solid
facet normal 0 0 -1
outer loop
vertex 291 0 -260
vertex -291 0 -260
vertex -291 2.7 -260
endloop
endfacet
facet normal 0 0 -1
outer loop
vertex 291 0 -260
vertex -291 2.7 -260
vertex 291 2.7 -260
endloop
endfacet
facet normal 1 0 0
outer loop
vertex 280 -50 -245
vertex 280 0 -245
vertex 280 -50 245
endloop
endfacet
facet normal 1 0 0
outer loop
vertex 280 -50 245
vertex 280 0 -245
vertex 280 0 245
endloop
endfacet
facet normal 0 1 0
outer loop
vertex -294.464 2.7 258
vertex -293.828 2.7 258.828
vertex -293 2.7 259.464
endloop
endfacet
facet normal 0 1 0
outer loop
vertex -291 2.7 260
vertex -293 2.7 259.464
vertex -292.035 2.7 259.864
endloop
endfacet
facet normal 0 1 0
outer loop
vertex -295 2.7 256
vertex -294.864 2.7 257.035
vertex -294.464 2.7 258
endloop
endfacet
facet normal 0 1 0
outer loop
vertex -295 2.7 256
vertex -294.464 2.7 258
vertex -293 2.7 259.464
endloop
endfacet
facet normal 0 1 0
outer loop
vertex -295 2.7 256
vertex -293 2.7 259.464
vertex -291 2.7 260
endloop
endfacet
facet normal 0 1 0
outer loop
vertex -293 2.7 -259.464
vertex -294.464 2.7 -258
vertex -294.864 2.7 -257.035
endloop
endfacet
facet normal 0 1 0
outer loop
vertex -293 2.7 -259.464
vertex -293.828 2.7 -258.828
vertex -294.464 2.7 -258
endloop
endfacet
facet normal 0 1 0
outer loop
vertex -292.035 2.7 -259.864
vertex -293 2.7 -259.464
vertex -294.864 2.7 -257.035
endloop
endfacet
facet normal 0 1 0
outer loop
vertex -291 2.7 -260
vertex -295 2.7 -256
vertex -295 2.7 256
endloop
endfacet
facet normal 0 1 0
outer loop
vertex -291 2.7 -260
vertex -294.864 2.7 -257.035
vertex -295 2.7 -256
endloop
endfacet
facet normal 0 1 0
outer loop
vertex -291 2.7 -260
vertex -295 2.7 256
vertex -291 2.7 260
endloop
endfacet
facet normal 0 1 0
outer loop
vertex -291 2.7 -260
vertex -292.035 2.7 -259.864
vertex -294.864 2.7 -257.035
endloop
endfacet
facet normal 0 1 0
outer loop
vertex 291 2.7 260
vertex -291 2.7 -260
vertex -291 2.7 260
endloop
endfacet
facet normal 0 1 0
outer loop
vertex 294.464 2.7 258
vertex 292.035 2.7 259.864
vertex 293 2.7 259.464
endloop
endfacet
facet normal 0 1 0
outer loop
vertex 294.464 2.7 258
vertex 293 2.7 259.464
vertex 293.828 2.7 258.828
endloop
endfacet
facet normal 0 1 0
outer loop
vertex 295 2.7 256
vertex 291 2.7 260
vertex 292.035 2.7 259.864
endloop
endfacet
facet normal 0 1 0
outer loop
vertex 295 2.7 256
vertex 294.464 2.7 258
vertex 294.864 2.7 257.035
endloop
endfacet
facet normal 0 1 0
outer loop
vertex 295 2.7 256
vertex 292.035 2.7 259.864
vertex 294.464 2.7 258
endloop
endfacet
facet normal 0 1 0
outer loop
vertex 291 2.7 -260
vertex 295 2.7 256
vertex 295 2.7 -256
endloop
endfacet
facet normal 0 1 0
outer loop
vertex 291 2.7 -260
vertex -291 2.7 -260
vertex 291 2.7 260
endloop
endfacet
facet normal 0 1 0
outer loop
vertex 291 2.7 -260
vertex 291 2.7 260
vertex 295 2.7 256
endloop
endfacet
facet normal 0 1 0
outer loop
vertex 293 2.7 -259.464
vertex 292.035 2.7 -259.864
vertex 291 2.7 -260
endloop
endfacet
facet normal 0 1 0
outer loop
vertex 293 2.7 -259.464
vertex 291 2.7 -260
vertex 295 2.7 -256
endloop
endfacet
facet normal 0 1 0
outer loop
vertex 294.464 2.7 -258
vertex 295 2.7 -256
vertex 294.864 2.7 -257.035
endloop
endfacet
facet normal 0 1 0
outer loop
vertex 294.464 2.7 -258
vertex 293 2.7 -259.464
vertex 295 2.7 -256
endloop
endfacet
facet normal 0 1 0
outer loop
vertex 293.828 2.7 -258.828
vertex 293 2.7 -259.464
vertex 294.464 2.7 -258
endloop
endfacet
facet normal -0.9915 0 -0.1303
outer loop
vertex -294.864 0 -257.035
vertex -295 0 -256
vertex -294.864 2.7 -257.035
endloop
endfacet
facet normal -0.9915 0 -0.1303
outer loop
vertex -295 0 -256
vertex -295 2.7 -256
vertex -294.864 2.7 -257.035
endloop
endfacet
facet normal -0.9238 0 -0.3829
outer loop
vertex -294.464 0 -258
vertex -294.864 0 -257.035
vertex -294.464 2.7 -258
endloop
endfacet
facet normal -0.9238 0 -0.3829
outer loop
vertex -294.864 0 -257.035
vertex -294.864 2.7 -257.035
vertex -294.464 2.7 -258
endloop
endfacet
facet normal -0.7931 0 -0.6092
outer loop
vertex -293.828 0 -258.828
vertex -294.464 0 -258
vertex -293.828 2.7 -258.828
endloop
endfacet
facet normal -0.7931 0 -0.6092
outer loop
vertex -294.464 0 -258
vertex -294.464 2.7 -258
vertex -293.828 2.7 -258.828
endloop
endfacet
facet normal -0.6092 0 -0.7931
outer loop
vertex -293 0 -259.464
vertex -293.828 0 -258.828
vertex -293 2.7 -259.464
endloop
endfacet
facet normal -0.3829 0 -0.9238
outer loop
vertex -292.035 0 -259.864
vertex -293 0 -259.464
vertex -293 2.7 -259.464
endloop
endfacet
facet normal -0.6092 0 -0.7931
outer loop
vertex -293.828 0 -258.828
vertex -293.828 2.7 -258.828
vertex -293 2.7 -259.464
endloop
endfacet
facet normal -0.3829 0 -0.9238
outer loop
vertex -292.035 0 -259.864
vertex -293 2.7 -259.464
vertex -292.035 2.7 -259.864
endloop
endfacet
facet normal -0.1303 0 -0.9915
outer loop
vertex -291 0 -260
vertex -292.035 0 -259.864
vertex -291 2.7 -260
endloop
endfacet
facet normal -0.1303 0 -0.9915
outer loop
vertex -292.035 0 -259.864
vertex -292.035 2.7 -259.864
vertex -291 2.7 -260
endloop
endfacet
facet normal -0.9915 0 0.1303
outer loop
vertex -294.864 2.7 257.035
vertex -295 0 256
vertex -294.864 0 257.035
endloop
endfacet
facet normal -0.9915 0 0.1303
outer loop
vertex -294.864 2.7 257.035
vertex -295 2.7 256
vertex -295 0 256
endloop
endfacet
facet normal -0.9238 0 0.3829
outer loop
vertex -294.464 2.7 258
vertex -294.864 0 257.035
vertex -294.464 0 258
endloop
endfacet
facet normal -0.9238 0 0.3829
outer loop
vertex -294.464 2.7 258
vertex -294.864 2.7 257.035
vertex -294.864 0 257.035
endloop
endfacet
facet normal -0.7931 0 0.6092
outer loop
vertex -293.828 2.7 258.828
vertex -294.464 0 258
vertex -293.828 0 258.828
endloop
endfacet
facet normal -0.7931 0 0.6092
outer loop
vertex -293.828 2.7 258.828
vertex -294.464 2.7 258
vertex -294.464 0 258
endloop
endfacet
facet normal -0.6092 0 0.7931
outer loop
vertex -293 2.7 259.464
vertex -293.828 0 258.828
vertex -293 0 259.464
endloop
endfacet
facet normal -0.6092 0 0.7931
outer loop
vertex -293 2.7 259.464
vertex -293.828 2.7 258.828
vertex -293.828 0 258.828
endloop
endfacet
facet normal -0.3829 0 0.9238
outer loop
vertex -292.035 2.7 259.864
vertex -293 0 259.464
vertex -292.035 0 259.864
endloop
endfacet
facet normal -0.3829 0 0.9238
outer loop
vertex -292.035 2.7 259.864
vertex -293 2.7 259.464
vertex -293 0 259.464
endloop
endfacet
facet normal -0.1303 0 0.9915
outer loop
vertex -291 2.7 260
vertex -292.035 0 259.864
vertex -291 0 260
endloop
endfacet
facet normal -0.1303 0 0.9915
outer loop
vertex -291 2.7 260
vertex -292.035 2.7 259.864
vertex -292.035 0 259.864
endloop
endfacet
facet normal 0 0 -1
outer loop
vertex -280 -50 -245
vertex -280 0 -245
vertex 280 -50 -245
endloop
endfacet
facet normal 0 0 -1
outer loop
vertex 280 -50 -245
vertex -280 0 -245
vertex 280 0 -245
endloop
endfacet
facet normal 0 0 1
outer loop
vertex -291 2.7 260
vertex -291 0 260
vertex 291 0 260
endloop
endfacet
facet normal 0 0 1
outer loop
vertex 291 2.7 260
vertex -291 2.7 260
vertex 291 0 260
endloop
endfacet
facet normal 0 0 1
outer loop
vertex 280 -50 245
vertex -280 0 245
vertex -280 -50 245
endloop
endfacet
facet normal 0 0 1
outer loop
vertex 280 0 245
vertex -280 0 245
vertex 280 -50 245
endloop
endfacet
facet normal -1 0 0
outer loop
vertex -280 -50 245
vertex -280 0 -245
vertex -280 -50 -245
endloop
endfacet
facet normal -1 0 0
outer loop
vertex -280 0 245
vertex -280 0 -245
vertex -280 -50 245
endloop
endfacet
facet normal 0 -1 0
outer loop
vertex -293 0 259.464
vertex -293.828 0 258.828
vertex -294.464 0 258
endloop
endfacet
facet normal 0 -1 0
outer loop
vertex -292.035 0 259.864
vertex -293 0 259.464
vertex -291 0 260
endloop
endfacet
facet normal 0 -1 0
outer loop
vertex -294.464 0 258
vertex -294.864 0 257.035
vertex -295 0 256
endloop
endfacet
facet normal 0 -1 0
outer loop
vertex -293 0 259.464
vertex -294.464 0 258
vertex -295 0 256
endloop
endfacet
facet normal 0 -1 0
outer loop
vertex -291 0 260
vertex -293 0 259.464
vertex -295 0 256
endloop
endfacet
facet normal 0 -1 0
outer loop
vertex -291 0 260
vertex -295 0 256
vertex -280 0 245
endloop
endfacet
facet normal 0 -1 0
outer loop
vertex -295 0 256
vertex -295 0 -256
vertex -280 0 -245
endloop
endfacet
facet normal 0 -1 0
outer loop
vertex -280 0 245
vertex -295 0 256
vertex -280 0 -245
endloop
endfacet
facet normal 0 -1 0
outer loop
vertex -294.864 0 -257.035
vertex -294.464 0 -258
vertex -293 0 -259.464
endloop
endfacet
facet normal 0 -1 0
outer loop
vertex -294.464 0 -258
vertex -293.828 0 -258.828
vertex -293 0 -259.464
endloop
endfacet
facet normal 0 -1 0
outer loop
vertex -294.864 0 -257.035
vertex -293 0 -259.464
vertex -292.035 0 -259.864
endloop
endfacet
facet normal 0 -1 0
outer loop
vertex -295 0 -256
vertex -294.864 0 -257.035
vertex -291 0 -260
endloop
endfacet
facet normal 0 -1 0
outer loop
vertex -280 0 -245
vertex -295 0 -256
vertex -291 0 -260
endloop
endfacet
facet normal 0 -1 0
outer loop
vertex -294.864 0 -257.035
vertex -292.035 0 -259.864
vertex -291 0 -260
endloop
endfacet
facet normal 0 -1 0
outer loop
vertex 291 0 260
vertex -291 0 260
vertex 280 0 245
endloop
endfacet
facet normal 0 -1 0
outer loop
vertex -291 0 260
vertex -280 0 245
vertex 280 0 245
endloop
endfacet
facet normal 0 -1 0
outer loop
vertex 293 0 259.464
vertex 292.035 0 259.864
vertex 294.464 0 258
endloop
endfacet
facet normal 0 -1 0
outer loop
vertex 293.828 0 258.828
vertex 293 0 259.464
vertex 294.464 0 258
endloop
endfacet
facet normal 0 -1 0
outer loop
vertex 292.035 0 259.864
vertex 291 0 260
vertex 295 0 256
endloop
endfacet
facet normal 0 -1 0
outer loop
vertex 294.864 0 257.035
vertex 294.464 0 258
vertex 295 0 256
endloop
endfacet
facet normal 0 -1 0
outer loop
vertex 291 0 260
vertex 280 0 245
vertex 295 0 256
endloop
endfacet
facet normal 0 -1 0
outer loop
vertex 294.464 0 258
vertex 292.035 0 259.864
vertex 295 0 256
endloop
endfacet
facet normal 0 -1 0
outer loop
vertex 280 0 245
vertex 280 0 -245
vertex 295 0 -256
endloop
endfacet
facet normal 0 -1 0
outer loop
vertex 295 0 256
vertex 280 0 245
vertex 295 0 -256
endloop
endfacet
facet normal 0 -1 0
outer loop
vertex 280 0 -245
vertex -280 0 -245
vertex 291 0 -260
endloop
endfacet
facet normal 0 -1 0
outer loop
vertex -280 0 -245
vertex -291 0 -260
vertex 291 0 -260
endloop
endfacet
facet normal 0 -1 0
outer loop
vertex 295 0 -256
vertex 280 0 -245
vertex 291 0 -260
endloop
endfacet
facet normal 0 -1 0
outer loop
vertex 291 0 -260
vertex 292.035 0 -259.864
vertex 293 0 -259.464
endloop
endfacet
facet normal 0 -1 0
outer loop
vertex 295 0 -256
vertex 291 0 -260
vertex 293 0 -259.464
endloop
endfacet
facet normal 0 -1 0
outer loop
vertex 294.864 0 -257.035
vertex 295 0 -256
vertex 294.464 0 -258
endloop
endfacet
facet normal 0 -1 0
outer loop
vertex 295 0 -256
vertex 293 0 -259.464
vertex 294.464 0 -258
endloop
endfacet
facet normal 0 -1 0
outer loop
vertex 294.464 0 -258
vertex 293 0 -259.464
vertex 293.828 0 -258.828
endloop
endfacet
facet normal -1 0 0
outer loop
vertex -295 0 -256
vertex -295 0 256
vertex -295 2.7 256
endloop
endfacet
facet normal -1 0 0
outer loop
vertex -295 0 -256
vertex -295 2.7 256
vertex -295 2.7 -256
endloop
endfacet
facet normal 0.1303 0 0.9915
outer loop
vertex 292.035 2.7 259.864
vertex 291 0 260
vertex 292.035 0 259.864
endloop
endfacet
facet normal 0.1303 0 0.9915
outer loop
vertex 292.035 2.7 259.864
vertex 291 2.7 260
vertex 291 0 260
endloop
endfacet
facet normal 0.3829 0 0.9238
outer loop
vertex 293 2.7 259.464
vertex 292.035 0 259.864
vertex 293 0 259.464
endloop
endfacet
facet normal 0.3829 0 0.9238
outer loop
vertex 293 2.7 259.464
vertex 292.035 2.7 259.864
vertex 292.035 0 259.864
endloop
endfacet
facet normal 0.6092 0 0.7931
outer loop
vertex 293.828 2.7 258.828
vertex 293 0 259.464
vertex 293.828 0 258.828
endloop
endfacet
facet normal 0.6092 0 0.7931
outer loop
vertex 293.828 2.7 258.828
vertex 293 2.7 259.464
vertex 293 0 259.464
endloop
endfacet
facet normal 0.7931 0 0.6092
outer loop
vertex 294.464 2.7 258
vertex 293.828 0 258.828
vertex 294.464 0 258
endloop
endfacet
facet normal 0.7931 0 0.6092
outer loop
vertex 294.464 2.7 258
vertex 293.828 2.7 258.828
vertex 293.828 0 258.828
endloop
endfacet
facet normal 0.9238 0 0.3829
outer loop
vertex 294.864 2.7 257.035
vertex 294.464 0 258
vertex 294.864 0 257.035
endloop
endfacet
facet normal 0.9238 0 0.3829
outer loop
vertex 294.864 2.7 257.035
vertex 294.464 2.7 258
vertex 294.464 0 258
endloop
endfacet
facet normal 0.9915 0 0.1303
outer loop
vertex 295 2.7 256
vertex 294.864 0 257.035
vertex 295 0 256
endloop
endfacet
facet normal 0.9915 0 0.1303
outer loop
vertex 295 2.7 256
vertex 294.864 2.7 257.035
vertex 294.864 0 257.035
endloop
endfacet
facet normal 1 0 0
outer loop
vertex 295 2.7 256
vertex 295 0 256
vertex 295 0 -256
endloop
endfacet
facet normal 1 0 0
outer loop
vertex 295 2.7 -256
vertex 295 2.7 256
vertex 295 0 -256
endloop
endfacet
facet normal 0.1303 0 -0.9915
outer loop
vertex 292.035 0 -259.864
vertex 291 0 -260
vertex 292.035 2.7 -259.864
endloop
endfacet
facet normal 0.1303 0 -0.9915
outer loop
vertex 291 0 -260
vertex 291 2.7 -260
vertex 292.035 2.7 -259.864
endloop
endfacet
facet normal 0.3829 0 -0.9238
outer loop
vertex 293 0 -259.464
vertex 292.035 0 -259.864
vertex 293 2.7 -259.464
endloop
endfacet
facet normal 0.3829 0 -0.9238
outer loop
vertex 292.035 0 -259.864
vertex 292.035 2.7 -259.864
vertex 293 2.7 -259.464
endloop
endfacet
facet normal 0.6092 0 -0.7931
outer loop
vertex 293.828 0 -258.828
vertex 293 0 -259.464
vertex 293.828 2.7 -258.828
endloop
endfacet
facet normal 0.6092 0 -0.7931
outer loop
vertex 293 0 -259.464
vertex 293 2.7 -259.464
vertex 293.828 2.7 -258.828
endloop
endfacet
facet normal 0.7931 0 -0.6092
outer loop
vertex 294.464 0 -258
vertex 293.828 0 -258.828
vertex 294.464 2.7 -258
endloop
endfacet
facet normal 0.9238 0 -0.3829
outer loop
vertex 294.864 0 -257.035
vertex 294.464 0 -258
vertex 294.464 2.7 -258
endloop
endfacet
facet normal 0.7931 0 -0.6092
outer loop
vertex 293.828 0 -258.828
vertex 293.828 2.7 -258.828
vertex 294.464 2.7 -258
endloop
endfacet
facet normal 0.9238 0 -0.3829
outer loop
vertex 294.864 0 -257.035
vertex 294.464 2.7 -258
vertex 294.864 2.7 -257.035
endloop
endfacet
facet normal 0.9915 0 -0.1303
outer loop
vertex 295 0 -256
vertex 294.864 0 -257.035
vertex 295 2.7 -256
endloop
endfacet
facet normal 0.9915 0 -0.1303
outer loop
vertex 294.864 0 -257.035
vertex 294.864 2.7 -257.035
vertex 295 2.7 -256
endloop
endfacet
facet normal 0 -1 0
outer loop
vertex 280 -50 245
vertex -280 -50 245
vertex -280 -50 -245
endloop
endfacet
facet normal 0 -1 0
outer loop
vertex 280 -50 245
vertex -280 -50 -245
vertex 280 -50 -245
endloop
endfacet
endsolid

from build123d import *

# Parameters (mm, degrees)
SKETCH1_W           = 590
SKETCH1_H           = 520
BOSS_EXTRUDE1_DEPTH = 2.7
SKETCH2_W           = 560
SKETCH2_H           = 490
BOSS_EXTRUDE2_DEPTH = 50
FILLET1_R           = 4


with BuildPart() as part:
    # Sketch1 → Boss-Extrude1 (new body)
    with BuildSketch(Plane(origin=(0, 0, 0), x_dir=(1, 0, 0), z_dir=(0, 1, 0))):
        Rectangle(SKETCH1_W, SKETCH1_H)
    extrude(amount=BOSS_EXTRUDE1_DEPTH)

    # Sketch2 → Boss-Extrude2 (add)
    with BuildSketch(Plane.XZ):
        Rectangle(SKETCH2_W, SKETCH2_H)
    extrude(amount=BOSS_EXTRUDE2_DEPTH)

    # Fillet1
    fillet1_edges = [part.edges().sort_by_distance(p)[0] for p in [
        (-295, 1.35, -260),
        (295, 1.35, -260),
        (295, 1.35, 260),
        (-295, 1.35, 260),
    ]]
    fillet(fillet1_edges, radius=FILLET1_R)


solid = part.part
